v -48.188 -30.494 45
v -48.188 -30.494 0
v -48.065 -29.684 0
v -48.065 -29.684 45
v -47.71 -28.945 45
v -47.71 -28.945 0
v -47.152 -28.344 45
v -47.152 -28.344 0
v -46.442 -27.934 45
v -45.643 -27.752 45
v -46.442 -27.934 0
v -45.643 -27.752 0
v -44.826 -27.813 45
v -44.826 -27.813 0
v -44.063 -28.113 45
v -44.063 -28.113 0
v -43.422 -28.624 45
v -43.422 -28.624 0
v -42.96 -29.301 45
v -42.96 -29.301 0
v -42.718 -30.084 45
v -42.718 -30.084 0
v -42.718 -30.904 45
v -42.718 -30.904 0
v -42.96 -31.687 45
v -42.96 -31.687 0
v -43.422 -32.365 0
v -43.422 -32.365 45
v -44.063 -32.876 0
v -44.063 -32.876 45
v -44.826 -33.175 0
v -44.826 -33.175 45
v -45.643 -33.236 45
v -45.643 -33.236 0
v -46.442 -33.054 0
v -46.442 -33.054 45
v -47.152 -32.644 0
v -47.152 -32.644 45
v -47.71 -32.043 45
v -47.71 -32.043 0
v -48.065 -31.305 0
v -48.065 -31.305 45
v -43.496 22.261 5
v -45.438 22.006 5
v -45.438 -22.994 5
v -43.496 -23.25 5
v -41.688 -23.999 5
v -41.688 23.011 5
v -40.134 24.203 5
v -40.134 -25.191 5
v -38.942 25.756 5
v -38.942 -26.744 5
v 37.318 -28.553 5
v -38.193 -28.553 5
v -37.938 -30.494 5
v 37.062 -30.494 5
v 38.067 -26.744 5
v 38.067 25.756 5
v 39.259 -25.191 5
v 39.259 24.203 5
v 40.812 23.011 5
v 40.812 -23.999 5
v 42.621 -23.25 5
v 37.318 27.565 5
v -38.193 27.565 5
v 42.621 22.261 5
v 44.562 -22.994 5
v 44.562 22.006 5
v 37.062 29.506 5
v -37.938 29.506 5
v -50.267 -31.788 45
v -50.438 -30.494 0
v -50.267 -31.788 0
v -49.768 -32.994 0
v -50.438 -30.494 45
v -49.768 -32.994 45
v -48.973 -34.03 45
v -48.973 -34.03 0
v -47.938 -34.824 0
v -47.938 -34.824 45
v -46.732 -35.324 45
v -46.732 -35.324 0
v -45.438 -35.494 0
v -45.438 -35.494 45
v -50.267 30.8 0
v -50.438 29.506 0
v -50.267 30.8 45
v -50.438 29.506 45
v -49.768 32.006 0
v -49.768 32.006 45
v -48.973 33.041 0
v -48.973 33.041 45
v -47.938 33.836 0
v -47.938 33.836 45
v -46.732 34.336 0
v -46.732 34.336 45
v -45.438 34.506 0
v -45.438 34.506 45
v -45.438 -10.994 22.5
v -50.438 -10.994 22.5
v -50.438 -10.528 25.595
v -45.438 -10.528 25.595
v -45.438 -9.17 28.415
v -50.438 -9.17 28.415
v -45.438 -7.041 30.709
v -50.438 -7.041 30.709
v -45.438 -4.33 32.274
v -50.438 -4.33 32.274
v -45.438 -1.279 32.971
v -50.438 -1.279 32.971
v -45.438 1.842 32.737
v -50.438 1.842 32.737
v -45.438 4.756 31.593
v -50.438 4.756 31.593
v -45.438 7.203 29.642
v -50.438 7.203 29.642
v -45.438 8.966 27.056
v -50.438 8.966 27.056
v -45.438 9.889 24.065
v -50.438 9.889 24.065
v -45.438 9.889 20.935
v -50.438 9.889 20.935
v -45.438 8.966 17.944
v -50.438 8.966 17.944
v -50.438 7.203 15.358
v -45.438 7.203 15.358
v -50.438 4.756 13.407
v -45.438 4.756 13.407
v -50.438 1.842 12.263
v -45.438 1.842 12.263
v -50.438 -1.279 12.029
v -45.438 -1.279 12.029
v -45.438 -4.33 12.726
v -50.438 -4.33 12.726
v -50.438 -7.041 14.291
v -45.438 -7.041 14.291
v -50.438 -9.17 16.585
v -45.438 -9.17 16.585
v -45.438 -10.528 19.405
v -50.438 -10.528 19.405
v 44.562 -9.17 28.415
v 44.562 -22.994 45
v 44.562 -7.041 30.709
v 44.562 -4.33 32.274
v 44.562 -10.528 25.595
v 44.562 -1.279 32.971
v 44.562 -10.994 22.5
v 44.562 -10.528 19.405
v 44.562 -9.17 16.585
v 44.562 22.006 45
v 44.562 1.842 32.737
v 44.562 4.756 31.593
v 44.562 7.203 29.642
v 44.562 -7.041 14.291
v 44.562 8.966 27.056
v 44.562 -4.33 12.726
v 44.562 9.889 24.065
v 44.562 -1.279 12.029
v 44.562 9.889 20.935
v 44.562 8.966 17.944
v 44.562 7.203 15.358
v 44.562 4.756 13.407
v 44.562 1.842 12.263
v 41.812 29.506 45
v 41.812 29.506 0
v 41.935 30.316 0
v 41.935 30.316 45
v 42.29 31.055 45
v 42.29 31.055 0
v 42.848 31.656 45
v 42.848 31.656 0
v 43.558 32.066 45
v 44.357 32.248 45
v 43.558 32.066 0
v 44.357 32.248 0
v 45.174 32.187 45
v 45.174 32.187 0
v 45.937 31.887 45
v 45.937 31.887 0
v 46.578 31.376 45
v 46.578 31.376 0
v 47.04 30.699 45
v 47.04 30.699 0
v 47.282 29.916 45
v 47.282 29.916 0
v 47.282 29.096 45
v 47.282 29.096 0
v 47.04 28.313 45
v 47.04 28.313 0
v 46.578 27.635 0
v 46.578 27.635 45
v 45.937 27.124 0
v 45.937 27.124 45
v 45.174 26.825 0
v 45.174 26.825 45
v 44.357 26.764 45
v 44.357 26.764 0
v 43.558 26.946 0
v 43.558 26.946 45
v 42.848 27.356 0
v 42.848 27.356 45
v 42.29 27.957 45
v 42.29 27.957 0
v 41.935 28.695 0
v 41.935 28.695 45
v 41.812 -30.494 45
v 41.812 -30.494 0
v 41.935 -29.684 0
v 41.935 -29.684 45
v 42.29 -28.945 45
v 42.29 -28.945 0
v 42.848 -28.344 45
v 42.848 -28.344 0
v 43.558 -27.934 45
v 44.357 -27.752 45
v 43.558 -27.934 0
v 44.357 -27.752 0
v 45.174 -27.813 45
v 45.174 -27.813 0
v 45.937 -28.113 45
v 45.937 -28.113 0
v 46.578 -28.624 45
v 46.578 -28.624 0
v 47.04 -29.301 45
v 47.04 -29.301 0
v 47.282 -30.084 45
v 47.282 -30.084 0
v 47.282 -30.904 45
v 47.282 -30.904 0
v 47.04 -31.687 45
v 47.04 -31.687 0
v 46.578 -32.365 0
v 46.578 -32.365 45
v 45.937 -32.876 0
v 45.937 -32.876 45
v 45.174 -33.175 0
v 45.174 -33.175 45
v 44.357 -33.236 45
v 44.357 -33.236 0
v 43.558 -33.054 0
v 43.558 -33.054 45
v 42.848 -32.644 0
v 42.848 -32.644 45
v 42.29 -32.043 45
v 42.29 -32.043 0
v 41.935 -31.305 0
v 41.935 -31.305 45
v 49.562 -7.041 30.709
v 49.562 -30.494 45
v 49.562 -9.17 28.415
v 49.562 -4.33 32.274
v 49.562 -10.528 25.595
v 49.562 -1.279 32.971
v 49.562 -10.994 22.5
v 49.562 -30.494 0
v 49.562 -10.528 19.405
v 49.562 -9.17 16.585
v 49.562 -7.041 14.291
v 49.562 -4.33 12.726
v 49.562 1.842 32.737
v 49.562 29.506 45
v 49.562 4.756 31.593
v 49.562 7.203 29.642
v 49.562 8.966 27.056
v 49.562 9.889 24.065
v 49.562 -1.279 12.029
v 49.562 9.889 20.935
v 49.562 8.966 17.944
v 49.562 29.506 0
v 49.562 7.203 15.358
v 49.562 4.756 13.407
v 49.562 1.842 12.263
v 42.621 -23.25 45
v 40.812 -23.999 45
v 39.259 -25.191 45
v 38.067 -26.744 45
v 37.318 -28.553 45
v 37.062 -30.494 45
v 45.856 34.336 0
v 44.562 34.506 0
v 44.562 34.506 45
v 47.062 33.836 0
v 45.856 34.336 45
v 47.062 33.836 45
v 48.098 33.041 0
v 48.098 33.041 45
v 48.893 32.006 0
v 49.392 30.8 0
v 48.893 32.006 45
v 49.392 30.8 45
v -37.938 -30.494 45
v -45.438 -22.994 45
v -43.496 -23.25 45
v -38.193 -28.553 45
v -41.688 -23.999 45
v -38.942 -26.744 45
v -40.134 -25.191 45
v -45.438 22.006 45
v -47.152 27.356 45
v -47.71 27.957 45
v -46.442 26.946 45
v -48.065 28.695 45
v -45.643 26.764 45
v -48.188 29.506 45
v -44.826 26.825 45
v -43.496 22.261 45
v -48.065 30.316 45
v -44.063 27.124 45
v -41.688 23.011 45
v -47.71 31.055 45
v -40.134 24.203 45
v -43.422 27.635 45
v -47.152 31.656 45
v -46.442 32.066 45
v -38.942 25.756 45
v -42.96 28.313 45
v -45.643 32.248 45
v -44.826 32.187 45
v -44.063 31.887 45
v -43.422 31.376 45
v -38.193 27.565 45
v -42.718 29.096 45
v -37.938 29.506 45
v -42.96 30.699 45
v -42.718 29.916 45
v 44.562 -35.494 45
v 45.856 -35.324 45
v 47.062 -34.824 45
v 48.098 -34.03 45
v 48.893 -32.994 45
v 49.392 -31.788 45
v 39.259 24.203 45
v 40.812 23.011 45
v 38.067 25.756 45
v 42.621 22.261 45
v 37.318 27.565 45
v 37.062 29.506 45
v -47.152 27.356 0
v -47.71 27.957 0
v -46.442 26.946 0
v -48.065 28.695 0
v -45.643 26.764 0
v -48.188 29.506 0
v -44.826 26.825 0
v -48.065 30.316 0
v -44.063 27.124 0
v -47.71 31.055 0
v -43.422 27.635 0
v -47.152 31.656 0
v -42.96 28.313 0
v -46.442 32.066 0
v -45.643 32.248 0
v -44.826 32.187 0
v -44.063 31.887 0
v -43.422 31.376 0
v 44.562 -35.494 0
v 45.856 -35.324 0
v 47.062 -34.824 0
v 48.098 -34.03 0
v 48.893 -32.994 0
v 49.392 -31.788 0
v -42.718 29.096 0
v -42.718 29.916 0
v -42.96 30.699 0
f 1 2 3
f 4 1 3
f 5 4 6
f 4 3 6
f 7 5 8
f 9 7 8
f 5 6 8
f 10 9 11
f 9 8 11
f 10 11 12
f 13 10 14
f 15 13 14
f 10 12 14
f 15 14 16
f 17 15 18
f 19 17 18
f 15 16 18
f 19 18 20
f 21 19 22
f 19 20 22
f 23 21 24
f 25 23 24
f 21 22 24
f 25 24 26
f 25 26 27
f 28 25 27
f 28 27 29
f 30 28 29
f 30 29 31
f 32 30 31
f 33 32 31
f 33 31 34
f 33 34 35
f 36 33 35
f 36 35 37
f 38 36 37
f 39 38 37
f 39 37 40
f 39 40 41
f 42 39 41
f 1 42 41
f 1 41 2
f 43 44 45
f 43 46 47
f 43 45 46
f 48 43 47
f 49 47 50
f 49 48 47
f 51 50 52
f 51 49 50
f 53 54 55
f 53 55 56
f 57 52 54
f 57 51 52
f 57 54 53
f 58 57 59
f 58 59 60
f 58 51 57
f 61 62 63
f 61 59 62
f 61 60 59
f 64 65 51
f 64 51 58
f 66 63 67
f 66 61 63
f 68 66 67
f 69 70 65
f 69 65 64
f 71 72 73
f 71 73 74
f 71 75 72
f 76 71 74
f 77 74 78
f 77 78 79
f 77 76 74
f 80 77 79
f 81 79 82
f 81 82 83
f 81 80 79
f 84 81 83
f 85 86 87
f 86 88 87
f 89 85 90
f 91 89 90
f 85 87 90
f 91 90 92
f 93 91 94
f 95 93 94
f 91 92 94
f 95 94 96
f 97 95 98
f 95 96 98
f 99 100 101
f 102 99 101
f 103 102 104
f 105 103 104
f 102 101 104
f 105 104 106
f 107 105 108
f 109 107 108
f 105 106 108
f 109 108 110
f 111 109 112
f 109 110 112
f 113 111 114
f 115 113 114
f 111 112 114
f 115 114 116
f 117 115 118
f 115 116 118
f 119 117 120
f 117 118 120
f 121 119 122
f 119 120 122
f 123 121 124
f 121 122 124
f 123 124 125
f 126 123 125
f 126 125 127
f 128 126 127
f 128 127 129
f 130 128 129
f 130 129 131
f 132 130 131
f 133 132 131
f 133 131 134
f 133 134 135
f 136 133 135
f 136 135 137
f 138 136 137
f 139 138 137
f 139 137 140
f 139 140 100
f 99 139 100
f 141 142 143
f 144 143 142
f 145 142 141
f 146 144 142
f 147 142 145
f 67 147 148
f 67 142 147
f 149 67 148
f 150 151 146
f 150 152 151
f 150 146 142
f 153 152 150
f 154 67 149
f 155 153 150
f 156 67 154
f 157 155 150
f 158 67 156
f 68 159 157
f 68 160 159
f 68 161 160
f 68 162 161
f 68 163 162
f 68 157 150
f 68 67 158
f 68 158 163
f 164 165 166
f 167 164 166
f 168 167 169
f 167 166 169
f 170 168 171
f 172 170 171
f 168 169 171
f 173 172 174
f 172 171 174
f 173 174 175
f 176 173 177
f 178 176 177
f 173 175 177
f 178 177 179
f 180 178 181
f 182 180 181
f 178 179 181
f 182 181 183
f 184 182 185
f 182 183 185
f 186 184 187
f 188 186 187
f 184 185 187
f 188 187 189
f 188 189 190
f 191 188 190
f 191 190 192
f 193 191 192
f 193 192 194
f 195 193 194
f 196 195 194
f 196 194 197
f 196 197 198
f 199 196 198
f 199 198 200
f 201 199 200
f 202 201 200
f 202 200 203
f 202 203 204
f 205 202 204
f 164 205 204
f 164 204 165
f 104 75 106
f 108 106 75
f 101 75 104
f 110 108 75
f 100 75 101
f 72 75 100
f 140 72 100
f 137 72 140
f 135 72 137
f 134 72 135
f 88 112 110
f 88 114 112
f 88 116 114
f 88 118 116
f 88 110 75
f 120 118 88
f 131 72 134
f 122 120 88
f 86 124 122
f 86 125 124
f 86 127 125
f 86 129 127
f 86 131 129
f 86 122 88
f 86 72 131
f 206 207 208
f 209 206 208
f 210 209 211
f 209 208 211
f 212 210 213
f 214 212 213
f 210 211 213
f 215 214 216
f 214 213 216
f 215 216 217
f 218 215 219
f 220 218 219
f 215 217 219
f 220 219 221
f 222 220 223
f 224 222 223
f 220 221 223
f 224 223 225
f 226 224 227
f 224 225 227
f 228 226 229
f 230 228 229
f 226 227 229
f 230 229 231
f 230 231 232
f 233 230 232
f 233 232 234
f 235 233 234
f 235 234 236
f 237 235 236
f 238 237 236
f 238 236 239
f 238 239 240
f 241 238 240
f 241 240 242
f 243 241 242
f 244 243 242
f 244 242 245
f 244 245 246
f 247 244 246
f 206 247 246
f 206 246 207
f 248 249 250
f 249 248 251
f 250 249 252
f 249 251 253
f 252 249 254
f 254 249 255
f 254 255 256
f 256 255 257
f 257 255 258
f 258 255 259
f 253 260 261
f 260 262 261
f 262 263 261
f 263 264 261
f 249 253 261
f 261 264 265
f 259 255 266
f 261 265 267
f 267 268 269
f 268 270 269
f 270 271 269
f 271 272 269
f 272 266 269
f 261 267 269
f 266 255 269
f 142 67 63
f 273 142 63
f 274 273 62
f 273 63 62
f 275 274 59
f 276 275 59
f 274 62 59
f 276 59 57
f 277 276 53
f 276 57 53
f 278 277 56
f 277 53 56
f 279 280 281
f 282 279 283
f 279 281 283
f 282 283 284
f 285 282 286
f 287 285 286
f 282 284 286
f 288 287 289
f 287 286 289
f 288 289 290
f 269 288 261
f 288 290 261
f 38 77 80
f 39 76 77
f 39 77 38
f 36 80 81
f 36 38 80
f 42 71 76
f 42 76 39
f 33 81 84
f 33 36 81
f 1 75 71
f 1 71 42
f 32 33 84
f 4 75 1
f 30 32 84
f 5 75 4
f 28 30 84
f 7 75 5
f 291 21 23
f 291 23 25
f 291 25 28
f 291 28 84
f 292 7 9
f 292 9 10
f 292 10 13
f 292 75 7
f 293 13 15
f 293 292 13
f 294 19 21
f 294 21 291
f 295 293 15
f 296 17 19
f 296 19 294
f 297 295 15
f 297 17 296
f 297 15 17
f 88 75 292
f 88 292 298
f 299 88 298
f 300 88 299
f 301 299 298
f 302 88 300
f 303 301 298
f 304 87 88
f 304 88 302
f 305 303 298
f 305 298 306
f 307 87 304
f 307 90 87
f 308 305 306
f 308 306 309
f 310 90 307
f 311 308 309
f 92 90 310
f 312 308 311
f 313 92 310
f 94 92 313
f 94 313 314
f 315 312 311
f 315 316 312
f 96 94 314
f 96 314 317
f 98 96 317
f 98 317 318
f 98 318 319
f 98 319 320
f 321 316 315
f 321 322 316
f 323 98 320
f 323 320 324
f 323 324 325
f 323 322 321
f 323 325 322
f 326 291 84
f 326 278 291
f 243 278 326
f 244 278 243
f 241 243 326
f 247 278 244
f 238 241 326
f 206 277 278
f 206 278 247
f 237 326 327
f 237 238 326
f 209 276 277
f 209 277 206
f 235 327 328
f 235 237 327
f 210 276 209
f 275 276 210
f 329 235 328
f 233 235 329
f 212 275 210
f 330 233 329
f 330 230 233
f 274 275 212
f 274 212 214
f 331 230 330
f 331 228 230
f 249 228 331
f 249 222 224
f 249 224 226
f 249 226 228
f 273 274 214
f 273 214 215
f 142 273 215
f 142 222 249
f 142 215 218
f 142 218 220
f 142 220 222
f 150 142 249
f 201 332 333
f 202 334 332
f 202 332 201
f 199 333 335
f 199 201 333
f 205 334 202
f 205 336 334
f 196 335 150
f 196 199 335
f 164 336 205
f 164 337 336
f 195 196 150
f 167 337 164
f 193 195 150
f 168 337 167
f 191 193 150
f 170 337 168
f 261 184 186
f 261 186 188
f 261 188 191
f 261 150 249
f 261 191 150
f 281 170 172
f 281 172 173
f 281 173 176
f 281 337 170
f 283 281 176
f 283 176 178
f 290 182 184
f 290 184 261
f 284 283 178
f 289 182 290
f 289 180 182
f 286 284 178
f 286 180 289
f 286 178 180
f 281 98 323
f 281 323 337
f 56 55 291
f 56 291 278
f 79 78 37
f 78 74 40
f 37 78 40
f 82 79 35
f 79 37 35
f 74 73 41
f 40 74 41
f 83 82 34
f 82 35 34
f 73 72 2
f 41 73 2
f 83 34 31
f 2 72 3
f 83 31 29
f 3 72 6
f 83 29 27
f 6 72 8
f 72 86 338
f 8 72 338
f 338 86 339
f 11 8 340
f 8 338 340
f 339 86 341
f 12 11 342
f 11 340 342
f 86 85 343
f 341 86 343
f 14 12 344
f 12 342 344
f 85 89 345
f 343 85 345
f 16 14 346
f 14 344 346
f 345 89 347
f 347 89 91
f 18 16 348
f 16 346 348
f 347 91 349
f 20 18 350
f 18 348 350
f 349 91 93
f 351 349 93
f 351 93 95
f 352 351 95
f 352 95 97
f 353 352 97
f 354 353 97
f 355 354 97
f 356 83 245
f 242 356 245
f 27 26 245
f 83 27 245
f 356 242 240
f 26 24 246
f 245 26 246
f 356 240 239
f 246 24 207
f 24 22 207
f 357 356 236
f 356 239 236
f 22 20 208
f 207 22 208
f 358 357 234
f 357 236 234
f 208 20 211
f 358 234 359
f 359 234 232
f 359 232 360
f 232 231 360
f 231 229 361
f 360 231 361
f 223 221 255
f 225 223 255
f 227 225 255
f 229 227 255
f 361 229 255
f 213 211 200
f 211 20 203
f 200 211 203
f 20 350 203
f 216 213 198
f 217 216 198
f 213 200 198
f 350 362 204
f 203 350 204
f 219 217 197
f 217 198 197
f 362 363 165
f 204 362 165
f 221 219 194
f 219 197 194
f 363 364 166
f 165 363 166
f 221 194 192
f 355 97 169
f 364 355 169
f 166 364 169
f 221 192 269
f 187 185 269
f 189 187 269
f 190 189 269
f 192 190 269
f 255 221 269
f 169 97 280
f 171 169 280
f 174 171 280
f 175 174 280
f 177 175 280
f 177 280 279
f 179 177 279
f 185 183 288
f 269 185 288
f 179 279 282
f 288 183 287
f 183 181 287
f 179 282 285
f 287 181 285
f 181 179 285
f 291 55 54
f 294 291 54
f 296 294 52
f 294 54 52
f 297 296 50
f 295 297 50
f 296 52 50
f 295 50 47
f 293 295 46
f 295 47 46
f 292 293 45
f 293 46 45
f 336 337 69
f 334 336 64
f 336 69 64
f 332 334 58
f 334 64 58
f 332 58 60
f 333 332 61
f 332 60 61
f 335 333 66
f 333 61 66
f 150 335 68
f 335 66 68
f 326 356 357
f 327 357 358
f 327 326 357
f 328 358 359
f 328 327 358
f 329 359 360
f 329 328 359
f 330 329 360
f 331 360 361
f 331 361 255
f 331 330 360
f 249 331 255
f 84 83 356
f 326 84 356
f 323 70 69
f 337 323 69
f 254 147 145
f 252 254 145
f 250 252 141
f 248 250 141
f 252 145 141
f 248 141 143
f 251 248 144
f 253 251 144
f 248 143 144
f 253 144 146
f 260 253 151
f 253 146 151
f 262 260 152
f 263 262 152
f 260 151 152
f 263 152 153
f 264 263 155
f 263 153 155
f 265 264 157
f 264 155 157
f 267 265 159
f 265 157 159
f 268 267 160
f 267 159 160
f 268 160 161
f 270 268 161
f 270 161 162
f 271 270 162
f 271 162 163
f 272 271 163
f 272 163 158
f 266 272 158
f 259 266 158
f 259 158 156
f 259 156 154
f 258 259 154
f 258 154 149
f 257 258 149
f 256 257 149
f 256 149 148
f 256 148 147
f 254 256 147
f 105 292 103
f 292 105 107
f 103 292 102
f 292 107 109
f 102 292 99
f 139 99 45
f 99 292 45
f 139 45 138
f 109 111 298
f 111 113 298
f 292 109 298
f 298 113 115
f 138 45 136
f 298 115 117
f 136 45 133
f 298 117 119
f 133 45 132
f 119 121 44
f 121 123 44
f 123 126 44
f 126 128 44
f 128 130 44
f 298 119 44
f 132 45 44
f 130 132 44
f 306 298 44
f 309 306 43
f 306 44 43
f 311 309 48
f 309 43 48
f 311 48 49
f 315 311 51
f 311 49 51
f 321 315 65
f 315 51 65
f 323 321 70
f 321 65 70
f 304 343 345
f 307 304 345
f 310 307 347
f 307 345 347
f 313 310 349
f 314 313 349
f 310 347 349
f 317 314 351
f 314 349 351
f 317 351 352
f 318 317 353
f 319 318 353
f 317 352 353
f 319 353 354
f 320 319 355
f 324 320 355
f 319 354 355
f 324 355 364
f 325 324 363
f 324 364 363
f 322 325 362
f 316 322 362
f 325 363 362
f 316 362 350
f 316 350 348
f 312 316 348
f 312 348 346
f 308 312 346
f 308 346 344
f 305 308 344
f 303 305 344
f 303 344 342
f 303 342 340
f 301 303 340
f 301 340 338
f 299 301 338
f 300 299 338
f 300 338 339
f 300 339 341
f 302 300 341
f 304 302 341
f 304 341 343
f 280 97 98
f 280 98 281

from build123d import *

# Parameters (mm, degrees)
F0_W     = 100
F0_H     = 70
F1_DEPTH = 45
F2_T     = -5
F4_DEPTH = 40
F6_D     = 5.5
F7_R     = 10.5
F8_DEPTH = 100.001
F10_R    = 5


with BuildPart() as f1:
    # F0 (on Top) → F1 (new body)
    with BuildSketch(Plane.XY):
        with Locations((-0.4376240075, -0.4940965772)):
            Rectangle(F0_W, F0_H)
    extrude(amount=F1_DEPTH)

    # F2
    f2_openings = [f1.faces().sort_by_distance(p)[0] for p in [
        (-0.437624, -0.494097, 45),
    ]]
    offset(amount=F2_T, openings=f2_openings)

    # F3 (on face) → F4 (join, through all)
    with BuildSketch(Plane.XY.offset(5)):
        with BuildLine():
            ThreePointArc((-45.4376240075, 22.0059034228), (-40.1343231486, 24.2026025639), (-37.9376240075, 29.5059034228))
            Line((-37.9376240075, 29.5059034228), (-45.4376240075, 29.5059034228))
            Line((-45.4376240075, 29.5059034228), (-45.4376240075, 22.0059034228))
        make_face()
        with BuildLine():
            ThreePointArc((-37.9376240075, -30.4940965772), (-40.1343231486, -25.1907957183), (-45.4376240075, -22.9940965772))
            Line((-45.4376240075, -22.9940965772), (-45.4376240075, -30.4940965772))
            Line((-45.4376240075, -30.4940965772), (-37.9376240075, -30.4940965772))
        make_face()
        with BuildLine():
            Line((44.5623759925, 29.5059034228), (37.0623759925, 29.5059034228))
            ThreePointArc((37.0623759925, 29.5059034228), (39.2590751336, 24.2026025639), (44.5623759925, 22.0059034228))
            Line((44.5623759925, 22.0059034228), (44.5623759925, 29.5059034228))
        make_face()
        with BuildLine():
            Line((44.5623759925, -30.4940965772), (44.5623759925, -22.9940965772))
            ThreePointArc((44.5623759925, -22.9940965772), (39.2590751336, -25.1907957183), (37.0623759925, -30.4940965772))
            Line((37.0623759925, -30.4940965772), (44.5623759925, -30.4940965772))
        make_face()
    extrude(amount=F4_DEPTH)

    # F6 (through all)
    with Locations(Plane.XY.offset(45)):
        with Locations((44.5623759925, 29.5059034228), (44.5623759925, -30.4940965772), (-45.4376240075, -30.4940965772), (-45.4376240075, 29.5059034228)):
            Hole(F6_D / 2)

    # F7 (on face) → F8 (cut, through all)
    with BuildSketch(Plane(origin=(-50.4376240075, 0, 0), x_dir=(0, -1, 0), z_dir=(-1, 0, 0))):
        with Locations((0.4940965772, 22.5)):
            Circle(F7_R)
    extrude(amount=-F8_DEPTH, mode=Mode.SUBTRACT)

    # F10
    f10_edges = [f1.edges().sort_by_distance(p)[0] for p in [
        (-50.437624, 34.505903, 22.5),
        (49.562376, 34.505903, 22.5),
        (-50.437624, -35.494097, 22.5),
        (49.562376, -35.494097, 22.5),
    ]]
    fillet(f10_edges, radius=F10_R)


solid = f1.part
